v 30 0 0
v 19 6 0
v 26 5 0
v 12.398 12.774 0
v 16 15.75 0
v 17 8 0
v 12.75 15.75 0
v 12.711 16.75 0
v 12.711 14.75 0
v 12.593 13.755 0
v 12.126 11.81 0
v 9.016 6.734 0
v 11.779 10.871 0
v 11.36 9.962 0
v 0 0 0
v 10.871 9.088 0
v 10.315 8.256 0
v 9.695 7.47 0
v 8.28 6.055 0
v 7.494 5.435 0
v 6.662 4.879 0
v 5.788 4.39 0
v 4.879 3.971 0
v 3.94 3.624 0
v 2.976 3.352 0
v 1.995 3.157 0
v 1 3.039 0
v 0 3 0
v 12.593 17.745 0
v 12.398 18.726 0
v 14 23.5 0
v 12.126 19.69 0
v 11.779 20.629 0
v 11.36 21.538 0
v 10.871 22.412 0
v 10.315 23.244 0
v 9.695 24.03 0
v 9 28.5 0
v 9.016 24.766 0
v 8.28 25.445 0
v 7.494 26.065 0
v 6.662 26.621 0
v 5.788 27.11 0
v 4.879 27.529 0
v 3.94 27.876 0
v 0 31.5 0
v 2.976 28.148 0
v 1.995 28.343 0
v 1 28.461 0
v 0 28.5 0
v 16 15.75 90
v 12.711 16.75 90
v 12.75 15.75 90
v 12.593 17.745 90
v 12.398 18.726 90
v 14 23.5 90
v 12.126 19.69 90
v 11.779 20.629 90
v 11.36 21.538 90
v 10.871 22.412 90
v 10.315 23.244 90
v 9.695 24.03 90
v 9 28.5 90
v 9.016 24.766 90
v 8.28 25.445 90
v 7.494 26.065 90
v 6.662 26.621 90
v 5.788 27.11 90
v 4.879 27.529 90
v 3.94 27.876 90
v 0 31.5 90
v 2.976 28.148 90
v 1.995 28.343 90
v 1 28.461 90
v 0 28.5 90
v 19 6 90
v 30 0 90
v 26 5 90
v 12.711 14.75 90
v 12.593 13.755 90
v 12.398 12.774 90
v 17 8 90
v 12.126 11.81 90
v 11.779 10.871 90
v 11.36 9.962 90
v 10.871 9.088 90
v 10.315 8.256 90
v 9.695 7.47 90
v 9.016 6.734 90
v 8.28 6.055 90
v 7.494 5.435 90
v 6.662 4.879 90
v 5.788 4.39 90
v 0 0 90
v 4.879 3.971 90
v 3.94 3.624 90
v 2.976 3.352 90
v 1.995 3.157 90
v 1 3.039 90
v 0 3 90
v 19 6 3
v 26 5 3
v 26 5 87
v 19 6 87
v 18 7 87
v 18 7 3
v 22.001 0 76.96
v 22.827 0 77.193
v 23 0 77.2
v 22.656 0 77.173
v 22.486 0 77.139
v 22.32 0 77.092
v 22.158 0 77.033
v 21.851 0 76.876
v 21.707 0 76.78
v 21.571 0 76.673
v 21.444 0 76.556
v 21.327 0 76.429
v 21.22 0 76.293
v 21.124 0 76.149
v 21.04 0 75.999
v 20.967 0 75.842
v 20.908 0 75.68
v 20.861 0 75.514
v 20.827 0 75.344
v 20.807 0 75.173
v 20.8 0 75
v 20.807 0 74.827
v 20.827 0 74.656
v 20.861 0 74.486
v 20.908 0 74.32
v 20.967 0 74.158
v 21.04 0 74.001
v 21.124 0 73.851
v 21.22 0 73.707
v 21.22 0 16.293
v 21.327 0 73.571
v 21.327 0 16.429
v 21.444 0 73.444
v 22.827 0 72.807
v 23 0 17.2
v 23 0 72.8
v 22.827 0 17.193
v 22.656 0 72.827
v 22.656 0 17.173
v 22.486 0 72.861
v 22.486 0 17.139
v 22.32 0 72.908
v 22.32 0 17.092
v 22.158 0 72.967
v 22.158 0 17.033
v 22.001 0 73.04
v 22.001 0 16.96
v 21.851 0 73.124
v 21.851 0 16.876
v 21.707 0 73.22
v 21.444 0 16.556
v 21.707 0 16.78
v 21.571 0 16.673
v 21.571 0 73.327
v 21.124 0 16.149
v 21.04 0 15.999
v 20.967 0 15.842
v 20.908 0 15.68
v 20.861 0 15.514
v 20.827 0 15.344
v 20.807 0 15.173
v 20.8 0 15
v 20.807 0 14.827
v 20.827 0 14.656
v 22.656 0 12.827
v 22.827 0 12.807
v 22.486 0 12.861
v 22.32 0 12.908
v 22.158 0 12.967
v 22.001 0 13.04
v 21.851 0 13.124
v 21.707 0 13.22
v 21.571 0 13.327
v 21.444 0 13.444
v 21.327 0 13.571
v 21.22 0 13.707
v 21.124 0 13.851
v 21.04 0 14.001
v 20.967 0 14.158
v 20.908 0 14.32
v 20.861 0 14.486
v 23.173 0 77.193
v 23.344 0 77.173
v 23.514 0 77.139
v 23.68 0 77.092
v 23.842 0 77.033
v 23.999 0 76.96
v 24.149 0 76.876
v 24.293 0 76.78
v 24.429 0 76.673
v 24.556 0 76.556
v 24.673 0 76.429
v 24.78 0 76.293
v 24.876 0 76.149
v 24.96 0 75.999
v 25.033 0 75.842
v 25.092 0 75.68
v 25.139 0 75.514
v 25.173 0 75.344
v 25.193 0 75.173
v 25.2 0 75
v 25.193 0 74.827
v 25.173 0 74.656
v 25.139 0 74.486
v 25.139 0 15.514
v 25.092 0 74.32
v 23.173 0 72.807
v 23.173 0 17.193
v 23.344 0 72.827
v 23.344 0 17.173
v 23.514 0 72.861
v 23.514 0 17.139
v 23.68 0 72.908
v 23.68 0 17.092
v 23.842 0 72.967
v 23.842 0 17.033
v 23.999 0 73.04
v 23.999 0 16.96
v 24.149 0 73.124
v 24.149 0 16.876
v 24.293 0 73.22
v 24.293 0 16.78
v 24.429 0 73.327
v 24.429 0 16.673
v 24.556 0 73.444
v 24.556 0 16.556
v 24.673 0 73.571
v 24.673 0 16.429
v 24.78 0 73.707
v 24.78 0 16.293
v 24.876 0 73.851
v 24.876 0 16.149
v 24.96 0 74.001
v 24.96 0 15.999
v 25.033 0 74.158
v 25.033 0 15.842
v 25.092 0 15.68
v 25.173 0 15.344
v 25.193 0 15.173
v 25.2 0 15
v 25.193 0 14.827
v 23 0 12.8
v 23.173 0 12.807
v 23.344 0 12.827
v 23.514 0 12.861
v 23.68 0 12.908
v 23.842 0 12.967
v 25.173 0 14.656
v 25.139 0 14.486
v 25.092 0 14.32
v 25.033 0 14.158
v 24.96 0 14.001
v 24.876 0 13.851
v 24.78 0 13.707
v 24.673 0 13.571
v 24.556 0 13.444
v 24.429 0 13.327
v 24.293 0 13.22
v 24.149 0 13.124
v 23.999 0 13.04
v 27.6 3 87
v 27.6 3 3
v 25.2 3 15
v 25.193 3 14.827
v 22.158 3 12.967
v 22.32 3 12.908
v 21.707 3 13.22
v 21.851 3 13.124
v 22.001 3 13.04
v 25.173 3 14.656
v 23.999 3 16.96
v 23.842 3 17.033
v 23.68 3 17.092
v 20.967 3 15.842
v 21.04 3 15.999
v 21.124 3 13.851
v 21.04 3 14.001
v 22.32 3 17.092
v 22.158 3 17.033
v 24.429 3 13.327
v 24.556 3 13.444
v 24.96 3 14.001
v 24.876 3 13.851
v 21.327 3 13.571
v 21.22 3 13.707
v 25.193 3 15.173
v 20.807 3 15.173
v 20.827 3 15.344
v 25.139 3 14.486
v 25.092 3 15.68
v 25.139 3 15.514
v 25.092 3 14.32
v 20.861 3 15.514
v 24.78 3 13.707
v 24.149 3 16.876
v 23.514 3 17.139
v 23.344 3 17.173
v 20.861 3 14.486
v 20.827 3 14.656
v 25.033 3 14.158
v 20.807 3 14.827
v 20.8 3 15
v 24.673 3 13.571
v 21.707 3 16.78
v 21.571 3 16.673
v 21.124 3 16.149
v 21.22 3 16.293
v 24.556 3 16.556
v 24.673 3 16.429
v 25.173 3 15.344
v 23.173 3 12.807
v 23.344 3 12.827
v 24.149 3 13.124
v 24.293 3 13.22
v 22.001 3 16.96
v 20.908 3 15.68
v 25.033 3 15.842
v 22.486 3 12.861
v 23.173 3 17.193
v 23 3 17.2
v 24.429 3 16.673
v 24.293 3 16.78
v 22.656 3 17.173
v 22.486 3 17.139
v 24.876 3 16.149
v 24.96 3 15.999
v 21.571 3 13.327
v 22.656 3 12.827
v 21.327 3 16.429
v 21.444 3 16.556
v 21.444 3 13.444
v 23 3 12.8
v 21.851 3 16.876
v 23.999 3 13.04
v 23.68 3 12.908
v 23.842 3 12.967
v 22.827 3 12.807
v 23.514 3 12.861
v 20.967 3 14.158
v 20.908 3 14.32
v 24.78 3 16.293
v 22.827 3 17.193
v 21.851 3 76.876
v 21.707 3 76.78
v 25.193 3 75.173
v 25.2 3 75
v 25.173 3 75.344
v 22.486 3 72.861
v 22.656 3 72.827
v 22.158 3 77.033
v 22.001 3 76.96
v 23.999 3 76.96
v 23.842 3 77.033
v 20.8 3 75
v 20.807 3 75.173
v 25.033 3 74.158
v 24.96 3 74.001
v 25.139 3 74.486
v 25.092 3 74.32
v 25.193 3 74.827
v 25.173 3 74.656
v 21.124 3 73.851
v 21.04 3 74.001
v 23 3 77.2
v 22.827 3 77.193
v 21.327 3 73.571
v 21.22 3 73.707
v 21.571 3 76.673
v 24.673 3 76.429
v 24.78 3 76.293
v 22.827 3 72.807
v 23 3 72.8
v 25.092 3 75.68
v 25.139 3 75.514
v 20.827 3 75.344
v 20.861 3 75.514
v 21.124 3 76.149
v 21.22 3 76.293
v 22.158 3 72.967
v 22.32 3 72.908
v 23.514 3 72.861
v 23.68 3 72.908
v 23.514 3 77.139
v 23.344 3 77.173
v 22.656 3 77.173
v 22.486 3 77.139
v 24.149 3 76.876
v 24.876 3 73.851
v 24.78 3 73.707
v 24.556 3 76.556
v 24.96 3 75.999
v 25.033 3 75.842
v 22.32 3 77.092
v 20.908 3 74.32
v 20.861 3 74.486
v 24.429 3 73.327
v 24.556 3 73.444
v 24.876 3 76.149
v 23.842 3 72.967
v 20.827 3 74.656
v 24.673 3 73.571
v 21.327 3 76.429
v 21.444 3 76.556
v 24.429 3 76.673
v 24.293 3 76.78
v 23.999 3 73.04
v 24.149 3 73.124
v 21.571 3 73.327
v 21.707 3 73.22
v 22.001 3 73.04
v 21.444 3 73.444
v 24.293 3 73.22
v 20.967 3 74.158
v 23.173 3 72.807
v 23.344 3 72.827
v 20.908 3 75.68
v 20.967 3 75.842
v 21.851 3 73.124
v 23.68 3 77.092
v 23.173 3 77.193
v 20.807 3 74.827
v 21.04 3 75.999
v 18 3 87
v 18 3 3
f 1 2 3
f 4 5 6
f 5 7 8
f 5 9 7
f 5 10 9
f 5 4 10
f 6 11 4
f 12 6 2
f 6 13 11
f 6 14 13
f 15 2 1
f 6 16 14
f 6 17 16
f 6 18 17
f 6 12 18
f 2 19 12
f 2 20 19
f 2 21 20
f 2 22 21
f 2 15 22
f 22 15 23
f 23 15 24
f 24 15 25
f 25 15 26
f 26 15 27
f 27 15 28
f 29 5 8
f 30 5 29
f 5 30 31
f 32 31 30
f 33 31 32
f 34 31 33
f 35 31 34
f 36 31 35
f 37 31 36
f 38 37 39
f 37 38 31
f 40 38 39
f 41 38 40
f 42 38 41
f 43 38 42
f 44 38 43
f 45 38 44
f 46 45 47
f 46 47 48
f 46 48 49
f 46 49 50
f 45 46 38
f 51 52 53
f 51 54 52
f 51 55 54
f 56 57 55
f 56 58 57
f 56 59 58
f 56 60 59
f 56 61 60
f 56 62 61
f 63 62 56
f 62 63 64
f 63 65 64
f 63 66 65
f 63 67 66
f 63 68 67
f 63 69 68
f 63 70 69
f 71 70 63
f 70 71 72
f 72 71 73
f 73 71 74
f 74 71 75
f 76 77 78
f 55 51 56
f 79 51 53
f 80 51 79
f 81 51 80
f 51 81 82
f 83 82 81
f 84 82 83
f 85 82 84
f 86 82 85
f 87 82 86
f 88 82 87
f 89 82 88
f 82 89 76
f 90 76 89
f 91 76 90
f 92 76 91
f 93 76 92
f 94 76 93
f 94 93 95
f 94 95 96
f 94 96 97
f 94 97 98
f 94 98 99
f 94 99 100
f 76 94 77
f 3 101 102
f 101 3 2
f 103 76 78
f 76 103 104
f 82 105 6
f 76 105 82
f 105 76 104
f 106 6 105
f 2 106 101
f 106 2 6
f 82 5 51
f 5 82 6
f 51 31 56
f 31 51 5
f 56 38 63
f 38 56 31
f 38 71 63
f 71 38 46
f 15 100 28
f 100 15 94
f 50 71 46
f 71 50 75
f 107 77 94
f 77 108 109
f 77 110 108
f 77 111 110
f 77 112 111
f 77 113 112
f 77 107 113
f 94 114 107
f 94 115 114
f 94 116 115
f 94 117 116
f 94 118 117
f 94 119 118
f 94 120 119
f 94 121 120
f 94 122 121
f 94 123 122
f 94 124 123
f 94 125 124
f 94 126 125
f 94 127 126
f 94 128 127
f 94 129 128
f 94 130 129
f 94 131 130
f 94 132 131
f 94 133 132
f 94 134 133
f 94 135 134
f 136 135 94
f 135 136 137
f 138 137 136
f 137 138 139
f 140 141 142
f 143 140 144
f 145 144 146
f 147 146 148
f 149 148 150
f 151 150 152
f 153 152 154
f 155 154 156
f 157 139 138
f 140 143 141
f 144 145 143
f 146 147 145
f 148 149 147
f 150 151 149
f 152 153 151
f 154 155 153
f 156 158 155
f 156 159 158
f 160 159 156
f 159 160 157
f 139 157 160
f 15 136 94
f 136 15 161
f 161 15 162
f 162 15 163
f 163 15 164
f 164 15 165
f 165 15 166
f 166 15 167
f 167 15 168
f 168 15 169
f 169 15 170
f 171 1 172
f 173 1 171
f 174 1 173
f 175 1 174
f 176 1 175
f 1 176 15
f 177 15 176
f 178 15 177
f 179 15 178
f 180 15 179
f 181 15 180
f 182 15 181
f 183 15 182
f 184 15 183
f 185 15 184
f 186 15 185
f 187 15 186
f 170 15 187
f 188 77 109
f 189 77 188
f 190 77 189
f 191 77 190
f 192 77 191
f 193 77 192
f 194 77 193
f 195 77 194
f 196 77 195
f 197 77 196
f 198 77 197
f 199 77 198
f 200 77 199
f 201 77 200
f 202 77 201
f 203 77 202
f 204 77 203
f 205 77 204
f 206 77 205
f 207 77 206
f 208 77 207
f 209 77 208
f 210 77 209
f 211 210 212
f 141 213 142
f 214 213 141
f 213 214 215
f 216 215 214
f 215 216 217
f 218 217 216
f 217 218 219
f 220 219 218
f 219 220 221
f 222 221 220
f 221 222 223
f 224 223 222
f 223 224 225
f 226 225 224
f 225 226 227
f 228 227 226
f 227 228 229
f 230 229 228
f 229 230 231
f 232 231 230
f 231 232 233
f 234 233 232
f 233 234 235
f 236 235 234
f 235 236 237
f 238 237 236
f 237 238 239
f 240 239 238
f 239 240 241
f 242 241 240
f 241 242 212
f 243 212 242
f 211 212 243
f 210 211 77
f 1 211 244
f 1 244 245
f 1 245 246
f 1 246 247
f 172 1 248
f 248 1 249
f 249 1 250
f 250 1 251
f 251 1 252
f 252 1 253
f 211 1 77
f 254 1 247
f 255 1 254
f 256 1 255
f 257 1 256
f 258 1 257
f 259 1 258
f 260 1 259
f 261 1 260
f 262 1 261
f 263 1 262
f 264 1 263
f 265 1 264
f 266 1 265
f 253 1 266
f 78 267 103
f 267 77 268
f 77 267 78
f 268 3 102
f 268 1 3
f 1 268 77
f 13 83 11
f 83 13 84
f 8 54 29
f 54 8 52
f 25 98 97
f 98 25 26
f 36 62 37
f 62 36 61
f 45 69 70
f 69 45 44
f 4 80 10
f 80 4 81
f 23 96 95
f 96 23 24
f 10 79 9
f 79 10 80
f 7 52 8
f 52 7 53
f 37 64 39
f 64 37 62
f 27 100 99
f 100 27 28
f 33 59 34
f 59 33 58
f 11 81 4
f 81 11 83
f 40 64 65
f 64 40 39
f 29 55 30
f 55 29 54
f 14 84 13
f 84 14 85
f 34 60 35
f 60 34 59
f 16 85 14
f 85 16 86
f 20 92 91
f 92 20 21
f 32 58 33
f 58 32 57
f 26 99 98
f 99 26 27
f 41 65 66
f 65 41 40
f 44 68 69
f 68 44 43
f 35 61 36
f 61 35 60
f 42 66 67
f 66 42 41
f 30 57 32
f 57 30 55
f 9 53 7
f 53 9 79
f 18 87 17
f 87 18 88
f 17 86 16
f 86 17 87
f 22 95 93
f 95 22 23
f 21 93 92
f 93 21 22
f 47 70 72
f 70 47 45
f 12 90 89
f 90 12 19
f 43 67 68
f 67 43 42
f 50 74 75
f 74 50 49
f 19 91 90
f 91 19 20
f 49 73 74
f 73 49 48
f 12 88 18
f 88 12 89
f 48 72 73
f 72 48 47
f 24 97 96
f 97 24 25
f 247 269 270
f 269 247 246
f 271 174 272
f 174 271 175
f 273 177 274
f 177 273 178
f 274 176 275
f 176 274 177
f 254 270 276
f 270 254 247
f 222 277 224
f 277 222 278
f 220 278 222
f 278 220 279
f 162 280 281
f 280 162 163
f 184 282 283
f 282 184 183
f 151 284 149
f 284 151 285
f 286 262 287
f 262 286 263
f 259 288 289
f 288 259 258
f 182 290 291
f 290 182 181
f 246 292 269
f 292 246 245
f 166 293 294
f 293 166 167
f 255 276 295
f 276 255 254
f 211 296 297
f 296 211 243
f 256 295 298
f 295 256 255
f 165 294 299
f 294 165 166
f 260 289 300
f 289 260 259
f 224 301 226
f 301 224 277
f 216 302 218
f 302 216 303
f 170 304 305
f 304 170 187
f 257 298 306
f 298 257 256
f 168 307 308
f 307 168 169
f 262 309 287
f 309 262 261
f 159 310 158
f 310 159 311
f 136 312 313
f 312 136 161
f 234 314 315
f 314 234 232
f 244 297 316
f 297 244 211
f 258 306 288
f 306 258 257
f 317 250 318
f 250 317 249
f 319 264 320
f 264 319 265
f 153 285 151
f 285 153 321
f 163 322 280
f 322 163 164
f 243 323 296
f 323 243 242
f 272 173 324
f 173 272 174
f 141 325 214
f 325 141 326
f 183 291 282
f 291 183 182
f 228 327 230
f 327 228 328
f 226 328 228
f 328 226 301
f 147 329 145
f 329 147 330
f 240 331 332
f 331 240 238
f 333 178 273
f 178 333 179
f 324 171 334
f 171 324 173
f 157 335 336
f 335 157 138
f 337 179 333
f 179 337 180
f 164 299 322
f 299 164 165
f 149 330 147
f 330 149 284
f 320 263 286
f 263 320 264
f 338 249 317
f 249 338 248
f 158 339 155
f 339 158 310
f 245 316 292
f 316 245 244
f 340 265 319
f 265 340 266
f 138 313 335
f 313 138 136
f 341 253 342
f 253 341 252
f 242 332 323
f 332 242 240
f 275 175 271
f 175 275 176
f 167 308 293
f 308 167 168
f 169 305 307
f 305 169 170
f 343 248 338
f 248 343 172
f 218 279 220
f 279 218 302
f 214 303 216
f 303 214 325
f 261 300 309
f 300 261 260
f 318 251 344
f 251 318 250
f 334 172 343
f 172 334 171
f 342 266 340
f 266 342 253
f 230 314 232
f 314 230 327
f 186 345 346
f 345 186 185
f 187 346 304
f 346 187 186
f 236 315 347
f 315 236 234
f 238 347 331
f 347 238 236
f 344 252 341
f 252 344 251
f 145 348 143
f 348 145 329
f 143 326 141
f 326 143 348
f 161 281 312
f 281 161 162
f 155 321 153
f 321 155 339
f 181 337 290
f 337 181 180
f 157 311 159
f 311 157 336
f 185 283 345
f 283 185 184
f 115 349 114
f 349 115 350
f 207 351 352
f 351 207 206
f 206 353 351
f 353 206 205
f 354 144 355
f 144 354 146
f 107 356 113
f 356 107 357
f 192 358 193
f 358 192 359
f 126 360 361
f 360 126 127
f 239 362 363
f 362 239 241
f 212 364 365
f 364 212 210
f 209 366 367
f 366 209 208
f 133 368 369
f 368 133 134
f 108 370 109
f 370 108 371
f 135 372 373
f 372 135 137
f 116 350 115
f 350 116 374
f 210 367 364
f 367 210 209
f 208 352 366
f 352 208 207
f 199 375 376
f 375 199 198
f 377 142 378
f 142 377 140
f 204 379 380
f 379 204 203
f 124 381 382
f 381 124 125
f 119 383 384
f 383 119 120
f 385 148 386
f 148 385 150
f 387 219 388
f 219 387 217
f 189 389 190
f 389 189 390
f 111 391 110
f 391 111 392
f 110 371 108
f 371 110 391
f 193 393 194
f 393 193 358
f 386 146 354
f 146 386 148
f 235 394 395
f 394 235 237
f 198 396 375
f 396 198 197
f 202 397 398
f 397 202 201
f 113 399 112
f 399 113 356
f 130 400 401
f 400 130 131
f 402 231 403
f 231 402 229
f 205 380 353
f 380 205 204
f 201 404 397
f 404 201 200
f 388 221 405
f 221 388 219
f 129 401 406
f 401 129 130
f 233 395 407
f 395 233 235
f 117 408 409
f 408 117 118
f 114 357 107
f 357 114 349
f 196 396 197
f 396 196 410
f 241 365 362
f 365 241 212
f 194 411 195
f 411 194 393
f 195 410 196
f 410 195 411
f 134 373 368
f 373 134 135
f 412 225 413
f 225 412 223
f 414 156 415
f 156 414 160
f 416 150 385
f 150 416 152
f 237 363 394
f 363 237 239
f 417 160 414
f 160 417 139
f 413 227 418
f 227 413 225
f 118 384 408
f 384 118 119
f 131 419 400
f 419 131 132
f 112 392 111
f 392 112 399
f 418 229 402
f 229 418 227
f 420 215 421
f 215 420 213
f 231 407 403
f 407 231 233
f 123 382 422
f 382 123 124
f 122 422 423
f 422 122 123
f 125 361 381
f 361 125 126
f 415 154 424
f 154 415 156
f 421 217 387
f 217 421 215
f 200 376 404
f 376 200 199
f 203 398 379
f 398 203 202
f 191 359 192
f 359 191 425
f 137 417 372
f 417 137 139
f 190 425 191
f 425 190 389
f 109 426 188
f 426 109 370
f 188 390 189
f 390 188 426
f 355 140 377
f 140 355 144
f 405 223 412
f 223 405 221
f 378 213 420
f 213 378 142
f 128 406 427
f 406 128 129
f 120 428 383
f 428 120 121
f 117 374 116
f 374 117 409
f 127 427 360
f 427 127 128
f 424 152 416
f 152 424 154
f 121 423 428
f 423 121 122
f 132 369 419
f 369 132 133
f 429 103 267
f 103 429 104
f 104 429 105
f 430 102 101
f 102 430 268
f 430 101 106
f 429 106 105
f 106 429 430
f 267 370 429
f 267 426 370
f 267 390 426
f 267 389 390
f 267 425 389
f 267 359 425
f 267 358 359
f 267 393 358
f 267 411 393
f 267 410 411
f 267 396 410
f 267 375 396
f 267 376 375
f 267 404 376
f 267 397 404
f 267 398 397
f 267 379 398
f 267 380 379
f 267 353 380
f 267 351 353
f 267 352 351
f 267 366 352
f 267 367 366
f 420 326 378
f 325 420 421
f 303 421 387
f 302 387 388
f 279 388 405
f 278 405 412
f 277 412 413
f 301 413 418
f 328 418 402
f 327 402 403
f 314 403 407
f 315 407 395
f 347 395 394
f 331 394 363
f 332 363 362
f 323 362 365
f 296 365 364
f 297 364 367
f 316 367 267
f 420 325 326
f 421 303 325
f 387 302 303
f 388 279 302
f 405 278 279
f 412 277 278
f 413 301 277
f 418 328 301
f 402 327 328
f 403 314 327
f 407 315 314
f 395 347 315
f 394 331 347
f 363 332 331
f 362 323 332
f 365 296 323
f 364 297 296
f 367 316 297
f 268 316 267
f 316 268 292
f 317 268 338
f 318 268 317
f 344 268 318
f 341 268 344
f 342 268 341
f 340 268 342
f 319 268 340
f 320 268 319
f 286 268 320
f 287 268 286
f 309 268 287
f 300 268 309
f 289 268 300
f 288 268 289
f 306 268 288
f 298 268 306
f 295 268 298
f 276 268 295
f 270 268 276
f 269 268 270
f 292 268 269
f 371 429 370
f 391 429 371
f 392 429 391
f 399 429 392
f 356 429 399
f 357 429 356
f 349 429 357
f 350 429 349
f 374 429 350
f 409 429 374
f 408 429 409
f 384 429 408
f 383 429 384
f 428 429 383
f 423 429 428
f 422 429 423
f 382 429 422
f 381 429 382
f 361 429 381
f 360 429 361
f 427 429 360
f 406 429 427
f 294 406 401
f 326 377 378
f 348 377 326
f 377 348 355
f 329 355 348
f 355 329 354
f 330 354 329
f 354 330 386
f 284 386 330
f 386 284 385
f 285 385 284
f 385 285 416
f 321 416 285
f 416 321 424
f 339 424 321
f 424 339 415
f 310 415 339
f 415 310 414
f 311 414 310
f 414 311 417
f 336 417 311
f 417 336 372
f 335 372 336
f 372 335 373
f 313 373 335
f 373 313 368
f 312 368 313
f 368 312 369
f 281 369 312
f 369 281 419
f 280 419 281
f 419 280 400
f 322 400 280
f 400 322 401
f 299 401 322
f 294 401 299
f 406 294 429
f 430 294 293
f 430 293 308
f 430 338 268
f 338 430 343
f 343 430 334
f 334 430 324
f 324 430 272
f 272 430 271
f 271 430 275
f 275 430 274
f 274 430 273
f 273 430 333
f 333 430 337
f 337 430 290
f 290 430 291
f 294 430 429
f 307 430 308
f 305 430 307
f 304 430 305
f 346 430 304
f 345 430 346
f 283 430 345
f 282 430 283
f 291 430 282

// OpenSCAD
fn = 80;
R = 25.5 / 2;
L = 90;

SCREW_HOLE_R = 4.4/2;

difference() {
	linear_extrude(L) {
		polygon([
			[0,0], [0,2*(3+R)], [9,2*(R+3)-3],
			[14,2*R-2], [16,3+R], [17,8], [19,6], [26,5],
			[30, 0]
		]);
	}

	translate([0,3+R,-5])
	cylinder(h=L+10, r=R, $fn=fn);


	translate([23,-10,15])
	rotate([-90,0,0])
	cylinder(h=20, r=SCREW_HOLE_R, $fn=fn);

	translate([23,-10,L-15])
	rotate([-90,0,0])
	cylinder(h=20, r=SCREW_HOLE_R, $fn=fn);

	translate([18,3,3])
	cube([30, 10, L-6]);	
}
